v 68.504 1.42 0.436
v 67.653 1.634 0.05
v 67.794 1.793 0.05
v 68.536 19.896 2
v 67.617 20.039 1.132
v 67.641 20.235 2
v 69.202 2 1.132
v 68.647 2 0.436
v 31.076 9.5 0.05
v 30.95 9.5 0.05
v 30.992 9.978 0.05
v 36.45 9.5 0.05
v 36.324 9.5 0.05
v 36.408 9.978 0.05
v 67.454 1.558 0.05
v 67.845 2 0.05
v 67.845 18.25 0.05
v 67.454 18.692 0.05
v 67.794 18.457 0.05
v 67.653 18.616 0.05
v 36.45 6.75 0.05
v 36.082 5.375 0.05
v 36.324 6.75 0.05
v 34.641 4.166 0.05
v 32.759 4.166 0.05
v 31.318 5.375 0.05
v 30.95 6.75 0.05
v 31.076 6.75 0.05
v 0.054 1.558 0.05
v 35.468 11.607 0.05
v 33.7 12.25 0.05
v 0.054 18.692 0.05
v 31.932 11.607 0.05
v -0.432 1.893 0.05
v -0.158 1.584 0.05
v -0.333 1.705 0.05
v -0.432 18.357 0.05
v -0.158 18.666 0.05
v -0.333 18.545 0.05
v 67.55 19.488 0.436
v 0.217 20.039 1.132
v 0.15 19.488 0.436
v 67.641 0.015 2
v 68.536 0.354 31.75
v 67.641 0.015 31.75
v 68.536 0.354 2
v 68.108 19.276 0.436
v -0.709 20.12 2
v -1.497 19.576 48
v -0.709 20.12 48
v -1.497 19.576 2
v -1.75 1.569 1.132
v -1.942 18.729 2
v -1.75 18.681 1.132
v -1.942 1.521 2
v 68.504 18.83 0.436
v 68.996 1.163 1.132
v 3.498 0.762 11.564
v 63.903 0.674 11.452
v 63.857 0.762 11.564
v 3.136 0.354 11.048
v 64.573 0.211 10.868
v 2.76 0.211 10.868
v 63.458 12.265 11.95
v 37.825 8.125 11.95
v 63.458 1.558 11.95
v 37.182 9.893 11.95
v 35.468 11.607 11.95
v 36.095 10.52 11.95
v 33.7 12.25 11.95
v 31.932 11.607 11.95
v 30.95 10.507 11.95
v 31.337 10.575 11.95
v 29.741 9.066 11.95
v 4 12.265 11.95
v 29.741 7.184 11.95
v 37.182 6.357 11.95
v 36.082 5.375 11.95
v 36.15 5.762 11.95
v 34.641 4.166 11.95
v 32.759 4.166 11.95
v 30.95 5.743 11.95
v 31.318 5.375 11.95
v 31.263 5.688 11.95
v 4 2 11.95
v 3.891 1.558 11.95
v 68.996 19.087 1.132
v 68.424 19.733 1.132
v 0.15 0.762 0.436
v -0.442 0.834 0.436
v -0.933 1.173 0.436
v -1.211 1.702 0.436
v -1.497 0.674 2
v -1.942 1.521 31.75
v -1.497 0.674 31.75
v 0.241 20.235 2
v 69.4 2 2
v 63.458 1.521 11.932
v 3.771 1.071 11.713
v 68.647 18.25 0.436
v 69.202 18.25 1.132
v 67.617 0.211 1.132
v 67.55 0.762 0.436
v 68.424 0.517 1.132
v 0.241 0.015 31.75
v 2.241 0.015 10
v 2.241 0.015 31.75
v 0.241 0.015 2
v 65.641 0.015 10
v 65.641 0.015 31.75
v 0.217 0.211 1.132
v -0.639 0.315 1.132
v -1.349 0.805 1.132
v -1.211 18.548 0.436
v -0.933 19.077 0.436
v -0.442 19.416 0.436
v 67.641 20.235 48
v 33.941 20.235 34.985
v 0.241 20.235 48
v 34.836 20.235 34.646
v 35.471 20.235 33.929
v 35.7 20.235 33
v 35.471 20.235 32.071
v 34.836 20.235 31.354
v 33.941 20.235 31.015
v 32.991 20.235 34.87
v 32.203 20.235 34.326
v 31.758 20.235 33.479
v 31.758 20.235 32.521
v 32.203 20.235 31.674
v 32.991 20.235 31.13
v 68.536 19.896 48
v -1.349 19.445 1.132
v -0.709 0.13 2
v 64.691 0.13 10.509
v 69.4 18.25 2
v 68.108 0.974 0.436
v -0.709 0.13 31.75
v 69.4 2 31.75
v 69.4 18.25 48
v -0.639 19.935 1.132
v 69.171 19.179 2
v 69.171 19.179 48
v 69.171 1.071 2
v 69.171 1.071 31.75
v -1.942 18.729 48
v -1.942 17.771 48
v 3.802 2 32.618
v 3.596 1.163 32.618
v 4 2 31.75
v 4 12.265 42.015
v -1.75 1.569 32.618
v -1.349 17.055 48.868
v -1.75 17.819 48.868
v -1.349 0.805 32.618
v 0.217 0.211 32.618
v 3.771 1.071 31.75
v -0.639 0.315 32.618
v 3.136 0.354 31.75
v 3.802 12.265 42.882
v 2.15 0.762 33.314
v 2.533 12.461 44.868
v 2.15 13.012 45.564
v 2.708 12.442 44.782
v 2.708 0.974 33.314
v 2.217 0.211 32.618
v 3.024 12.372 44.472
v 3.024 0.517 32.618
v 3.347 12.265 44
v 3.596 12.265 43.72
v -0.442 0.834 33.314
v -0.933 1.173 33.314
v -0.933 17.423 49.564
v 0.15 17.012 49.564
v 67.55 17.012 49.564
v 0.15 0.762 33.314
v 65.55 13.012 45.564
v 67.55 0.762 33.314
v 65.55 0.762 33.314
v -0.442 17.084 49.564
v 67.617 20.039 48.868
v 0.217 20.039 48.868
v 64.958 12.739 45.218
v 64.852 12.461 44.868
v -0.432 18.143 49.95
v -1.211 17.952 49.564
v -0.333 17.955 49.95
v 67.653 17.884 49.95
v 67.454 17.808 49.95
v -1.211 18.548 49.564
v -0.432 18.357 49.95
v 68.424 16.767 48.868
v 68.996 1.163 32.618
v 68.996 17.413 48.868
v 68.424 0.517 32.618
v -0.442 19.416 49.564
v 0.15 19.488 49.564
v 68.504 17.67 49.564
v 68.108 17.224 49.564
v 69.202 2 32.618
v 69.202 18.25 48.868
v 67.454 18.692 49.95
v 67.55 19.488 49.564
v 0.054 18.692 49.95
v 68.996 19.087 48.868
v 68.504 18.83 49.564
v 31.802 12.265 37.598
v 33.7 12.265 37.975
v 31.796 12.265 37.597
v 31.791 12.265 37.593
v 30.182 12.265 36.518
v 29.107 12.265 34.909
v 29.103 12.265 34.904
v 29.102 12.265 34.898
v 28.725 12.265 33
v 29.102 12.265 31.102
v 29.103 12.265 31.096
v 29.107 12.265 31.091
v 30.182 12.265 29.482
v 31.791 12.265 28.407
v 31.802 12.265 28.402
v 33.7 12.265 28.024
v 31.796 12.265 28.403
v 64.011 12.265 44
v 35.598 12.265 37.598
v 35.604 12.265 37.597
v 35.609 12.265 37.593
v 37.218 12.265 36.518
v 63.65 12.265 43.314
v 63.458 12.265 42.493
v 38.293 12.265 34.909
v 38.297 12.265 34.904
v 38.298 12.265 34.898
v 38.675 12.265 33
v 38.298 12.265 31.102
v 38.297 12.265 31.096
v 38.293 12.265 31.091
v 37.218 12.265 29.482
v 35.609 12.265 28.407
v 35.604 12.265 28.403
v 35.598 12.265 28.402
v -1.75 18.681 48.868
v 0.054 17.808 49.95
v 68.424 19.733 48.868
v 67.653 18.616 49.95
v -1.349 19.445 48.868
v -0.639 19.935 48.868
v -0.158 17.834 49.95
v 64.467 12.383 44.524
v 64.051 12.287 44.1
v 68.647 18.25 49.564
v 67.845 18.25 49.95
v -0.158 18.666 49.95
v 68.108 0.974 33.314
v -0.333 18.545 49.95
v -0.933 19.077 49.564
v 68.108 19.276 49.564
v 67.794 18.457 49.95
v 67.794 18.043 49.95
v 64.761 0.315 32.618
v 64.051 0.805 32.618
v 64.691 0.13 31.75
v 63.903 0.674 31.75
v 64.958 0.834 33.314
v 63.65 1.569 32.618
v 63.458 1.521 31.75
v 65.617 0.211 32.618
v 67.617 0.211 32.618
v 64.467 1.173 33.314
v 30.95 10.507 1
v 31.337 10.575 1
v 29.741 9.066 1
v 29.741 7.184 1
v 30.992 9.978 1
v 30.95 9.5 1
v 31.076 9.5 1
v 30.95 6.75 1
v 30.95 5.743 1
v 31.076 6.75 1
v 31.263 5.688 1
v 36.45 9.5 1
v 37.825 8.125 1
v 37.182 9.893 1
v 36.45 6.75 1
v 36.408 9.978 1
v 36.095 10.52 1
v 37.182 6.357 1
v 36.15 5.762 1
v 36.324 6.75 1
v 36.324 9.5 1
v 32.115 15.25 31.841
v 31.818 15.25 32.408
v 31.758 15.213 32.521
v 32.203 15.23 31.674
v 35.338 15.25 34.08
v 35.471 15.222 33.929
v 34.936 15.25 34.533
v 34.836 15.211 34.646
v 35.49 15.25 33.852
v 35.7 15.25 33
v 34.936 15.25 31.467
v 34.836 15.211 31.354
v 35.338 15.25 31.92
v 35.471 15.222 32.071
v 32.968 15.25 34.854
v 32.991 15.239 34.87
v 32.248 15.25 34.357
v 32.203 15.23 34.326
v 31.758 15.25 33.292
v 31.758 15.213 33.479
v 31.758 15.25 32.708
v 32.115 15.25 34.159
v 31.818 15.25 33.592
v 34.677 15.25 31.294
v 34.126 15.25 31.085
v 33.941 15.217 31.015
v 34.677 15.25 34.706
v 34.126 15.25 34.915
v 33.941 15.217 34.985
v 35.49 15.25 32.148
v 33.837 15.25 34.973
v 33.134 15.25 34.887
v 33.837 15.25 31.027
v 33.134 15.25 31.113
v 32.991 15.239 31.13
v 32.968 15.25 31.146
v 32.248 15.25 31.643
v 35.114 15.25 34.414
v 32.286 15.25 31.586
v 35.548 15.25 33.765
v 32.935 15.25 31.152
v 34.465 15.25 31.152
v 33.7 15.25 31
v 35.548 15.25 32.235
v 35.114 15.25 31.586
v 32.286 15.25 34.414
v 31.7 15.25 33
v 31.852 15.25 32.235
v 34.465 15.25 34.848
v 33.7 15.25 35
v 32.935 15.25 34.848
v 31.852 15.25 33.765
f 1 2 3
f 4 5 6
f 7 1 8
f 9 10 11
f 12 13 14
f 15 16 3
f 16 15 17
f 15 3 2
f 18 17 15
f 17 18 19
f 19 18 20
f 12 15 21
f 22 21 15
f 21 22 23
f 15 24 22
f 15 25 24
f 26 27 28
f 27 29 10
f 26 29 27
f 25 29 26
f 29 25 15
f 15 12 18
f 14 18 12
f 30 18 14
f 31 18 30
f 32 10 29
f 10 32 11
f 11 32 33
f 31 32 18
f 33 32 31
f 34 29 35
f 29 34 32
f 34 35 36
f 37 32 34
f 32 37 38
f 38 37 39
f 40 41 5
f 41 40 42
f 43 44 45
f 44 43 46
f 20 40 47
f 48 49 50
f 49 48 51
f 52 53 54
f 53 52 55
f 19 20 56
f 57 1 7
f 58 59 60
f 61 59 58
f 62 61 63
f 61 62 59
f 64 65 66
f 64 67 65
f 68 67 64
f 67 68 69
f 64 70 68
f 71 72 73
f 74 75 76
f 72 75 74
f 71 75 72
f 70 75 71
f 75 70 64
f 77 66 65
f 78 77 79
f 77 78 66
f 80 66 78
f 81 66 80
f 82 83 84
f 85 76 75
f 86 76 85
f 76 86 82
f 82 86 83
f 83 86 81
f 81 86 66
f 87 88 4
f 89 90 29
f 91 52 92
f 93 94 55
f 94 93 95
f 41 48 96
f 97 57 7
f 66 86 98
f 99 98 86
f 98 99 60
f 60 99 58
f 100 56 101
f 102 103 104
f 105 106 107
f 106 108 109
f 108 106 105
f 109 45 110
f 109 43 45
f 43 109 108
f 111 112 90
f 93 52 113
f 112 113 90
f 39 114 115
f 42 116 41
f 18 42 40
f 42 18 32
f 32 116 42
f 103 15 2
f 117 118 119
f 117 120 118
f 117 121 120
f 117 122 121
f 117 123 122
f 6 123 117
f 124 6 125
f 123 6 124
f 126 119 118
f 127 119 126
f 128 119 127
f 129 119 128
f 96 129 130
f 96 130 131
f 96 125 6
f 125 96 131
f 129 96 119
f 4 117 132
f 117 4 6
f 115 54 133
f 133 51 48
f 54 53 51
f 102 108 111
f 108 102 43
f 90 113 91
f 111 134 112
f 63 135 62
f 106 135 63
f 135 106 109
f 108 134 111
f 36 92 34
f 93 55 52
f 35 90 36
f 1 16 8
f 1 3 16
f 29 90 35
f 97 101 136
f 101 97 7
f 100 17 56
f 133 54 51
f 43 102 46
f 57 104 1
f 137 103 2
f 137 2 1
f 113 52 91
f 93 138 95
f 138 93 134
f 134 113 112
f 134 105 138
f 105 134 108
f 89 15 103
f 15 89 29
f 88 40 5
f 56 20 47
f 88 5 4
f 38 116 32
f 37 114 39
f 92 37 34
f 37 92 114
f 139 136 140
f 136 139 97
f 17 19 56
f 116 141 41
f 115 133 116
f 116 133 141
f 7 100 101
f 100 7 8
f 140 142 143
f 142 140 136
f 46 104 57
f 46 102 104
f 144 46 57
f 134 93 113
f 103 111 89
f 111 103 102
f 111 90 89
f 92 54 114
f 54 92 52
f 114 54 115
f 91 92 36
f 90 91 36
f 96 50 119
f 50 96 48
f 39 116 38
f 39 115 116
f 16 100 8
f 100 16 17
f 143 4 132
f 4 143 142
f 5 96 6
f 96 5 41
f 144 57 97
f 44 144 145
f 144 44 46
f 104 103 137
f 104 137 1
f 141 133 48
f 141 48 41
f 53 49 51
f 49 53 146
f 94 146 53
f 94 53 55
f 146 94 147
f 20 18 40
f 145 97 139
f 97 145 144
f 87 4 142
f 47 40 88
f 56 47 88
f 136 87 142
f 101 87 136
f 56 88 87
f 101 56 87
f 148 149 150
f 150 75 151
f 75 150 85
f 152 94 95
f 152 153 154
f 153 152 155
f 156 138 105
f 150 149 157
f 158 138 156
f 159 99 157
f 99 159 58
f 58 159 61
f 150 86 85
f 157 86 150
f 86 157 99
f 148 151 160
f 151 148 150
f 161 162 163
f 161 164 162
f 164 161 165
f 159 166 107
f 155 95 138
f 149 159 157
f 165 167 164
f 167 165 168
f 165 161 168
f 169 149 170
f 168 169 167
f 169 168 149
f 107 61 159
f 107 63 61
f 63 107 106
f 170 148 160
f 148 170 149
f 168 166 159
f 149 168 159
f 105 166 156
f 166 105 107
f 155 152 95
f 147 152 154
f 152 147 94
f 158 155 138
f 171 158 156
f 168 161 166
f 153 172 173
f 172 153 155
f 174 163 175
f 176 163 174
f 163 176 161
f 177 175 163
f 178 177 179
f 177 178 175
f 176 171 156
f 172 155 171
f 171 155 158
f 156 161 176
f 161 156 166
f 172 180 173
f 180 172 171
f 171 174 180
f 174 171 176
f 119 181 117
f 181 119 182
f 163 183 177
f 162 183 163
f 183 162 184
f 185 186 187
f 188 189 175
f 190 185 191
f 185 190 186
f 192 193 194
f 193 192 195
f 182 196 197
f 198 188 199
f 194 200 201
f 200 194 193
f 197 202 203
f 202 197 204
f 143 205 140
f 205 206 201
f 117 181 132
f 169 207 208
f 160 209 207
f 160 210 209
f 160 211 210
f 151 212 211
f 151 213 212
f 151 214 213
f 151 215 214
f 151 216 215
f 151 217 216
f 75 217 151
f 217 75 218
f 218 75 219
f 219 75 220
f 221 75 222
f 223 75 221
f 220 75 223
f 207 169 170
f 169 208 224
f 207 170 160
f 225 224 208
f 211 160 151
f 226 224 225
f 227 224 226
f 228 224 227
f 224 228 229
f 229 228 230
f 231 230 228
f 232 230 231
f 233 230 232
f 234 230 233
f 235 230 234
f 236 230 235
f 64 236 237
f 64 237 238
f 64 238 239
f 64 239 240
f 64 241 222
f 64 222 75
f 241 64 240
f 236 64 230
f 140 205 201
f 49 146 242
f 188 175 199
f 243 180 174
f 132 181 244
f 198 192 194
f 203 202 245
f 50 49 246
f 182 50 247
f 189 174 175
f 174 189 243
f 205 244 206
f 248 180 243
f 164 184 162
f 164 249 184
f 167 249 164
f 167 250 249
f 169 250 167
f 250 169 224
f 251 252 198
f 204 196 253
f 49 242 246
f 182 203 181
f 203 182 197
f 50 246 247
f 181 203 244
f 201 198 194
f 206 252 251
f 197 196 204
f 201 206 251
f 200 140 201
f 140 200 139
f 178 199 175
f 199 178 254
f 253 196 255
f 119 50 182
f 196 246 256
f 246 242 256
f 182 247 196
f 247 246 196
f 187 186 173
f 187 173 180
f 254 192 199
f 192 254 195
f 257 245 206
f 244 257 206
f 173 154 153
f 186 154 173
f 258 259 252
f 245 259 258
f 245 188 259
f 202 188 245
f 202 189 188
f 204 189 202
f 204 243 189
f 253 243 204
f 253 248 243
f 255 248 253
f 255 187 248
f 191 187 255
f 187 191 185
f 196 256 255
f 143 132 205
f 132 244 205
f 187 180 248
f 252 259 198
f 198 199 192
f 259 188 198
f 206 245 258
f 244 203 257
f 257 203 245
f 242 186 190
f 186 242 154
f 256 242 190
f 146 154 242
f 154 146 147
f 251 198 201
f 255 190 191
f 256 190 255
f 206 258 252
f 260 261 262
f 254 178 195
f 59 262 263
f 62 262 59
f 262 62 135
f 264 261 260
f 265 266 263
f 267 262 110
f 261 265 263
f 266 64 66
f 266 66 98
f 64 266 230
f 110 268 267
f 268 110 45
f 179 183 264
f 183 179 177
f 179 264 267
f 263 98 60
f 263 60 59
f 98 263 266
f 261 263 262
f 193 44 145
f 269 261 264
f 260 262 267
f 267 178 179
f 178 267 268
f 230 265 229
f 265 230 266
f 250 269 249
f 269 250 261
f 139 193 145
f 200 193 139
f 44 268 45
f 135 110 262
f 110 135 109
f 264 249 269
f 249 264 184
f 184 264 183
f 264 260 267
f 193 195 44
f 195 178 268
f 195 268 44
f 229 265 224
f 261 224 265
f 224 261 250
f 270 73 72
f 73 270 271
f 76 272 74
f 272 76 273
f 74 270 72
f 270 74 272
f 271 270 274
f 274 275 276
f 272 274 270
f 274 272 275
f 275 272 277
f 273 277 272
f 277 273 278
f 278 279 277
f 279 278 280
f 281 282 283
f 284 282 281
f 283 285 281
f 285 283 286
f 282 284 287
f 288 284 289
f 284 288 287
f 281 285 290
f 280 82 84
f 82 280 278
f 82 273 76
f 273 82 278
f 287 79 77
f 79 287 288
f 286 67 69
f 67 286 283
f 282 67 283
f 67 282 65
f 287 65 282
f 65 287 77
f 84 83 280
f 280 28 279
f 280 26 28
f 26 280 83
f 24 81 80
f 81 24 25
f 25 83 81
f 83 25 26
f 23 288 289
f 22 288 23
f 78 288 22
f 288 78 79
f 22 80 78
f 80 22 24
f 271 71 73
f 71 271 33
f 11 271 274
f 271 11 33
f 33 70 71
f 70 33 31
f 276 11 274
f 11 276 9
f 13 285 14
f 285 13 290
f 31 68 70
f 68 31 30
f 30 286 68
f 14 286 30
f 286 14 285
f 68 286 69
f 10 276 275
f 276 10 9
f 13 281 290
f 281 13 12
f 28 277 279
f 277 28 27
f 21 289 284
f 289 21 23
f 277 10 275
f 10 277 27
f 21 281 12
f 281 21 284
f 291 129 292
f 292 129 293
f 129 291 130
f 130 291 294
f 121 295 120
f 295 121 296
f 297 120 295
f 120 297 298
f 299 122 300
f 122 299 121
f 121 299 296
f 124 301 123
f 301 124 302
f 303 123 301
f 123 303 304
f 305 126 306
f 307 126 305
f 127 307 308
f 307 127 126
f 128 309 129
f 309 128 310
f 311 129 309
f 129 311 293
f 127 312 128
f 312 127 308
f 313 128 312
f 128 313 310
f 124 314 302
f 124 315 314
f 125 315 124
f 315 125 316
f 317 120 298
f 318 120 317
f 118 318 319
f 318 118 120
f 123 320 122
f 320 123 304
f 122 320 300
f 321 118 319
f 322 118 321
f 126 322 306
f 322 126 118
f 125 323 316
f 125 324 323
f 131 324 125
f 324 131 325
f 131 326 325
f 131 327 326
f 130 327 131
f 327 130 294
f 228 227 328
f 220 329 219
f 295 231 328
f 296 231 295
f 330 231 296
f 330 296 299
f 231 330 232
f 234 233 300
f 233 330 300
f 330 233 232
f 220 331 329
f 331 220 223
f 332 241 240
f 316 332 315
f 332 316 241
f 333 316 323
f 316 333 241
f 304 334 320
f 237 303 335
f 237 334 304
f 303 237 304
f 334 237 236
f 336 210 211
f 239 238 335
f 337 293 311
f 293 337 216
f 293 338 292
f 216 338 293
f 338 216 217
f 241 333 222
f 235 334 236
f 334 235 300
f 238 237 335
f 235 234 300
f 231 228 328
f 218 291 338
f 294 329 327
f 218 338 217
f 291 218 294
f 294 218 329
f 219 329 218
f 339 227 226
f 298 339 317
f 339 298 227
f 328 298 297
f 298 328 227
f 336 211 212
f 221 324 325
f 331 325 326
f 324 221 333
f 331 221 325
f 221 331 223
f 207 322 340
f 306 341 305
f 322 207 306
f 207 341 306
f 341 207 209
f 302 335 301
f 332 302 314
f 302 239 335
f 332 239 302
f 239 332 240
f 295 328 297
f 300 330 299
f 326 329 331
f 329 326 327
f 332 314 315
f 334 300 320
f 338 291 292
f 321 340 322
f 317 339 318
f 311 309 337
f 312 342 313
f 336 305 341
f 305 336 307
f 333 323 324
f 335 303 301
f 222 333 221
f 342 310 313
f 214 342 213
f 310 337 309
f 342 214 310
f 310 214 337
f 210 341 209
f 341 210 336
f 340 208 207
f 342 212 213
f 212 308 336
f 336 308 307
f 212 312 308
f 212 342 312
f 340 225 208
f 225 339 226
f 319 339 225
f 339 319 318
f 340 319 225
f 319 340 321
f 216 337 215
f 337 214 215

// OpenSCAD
/* [Phones] */

Phone_1=0; // [0:iPhone 5, 1:iPhone 5 in Belkin Grip Candy Sheer, 2: iPhone 5 in Incipio Dual Pro, 3:iPhone 4/4s, 4:iPhone 4/4s in elago S4 Glide, 5:iPhone 4/4s in iFrogz Luxe Lean, 99:Custom]
Phone_2=-1; // [-1:None, 0:iPhone 5, 1:iPhone 5 in Belkin Grip Candy Sheer, 2: iPhone 5 in Incipio Dual Pro, 3:iPhone 4/4s, 4:iPhone 4/4s in elago S4 Glide, 5:iPhone 4/4s in iFrogz Luxe Lean, 99:Custom]
Phone_3=-1; // [-1:None, 0:iPhone 5, 1:iPhone 5 in Belkin Grip Candy Sheer, 2: iPhone 5 in Incipio Dual Pro, 3:iPhone 4/4s, 4:iPhone 4/4s in elago S4 Glide, 5:iPhone 4/4s in iFrogz Luxe Lean, 99:Custom]

// Dock Wall Thickness

/* [Advanced Settings] */
wall_thickness=4; //[1:6]
rounding_radius=2;

// Screw hole height
screw_height=20; //[0:35]
// Screw Diameter
screw_diameter=4; //[1:6]
// Countersink Size
screw_countersink_size=3;
//  Countersink Depth
screw_countersink_depth=3;


actual_depth=20.25;
/* [Custom Dimensions] */
/* Custom 1 Width */
Custom1_width=59.4;
/* Custom 1 Depth */
Custom1_depth=8.25;
//What kind of connector does your phone have?
Custom1_connector="Lightning"; /* ["Lightning", "Dock"] */
//How far should the connector body stick out of the bottom of the dock?
Custom1_stickout=0;
 
/* Custom 2 Width */
Custom2_width=59.4;
/* Custom 2 Depth */
Custom2_depth=8.25;
//What kind of connector does your phone have?
Custom2_connector="Lightning"; /* ["Lightning", "Dock"] */
//How far should the connector body stick out of the bottom of the dock?
Custom2_stickout=0;
 
/* Custom 3 Width */
Custom3_width=59.4;
/* Custom 3 Depth */
Custom3_depth=8.25;
//What kind of connector does your phone have?
Custom3_connector="Lightning"; /* ["Lightning", "Dock"] */
//How far should the connector body stick out of the bottom of the dock?
Custom3_stickout=0;
 

/* [hidden] */
custom1=[Custom1_width, Custom1_depth, 40, Custom1_connector, Custom1_stickout];
custom2=[Custom2_width, Custom2_depth, 40, Custom2_connector, Custom2_stickout];
custom3=[Custom3_width, Custom3_depth, 40, Custom3_connector, Custom3_stickout];

button_cutout_radius=8;
button_height=10;
circle_precision=1;
usb_connector_height=20;

dock_connector_thickness=6.0;
dock_connector_width=27;
dock_connector_height=9;

lightning_connector_height=12;
lightning_connector_width=8.25;
lightning_connector_thickness=5.5;

/* Turn of rounding for fast preview */
preview_tab="none";


extra=0.1;
overlap=0.05;
dimensions=[ /* [phone_width, phone_depth, pocket_height, connector, connector_stickout] */
	/* iphone 5 */
	[59.4,8.25,40,"lightning",0],
	/* iphone 5 in belkin case */
	[64.25,10.75,40,"lightning",2.5],
	/* iPhone 5 in incipio Dual Pro */
	[65.25, 13.5, 40, "lightning", 0],
     /* iphone 4/4s */
	[59.25, 9.75, 40, "dock", 0],
     /*  iphone 4/4s in elago S4 Glide */
     [63.5, 12.25, 40, "dock", 0],
	/*  iphone 4/4s in ifrogz */
     [61.5, 12, 40, "dock", 0]
	];

if (Phone_1==99)
	iphone_dock(custom1,rounding=rounding_radius);
else 
	iphone_dock(dimensions[Phone_1], rounding=rounding_radius);
if (Phone_2 != -1) {
	translate([(Phone_1==99 ? custom1[0] : dimensions[Phone_1][0])+wall_thickness*2-overlap,0,0]) 	{
		if (Phone_2==99 )
			iphone_dock(custom2, rounding=rounding_radius);
            else 
			iphone_dock(dimensions[Phone_2], rounding=rounding_radius);
		if (Phone_3 != -1)
			translate([(Phone_2==99 ? custom2[0] : dimensions[Phone_2][0])+wall_thickness*2-overlap,0,0])
				if (Phone_3==99)
					iphone_dock(custom3, rounding=rounding_radius);
				else
					iphone_dock(dimensions[phone3], rounding=rounding_radius);
	}
}

module iphone_dock(setup=[59.4, 8.25, 40, "lightning", 0], rounding=false) {
	phone_width=setup[0];
	phone_depth=setup[1];
	pocket_height=setup[2];
	connector=setup[3];
	connector_stickout=setup[4];

	case_width=phone_width+wall_thickness*2;
	case_depth=phone_depth+wall_thickness*2;
	case_height=pocket_height+wall_thickness+dock_connector_height;

	translate([case_width/2,case_depth/2,0]) difference() {
		if (rounding!=0 && preview_tab == "none") {
			minkowski() {
				difference() {
					translate([-case_width/2,-case_depth/2,0]) rotate([90,0,90]) 
						linear_extrude(height=case_width) 
							polygon(points=[[rounding_radius,rounding_radius],[actual_depth-rounding_radius,rounding_radius],[actual_depth-rounding_radius,case_height-rounding_radius*2.5],[rounding_radius,case_height-actual_depth-rounding_radius/2]]);
						translate([0,0,pocket_height/2+wall_thickness+dock_connector_height-rounding_radius])
							cube([phone_width+rounding_radius*2,phone_depth+rounding_radius*2,pocket_height+rounding_radius], center=true);
						translate([0,-case_depth/2+wall_thickness/2,wall_thickness+dock_connector_height+button_height])
							button_cutout();
					}
				sphere(rounding_radius, $fs=circle_precision);
			}
		} else {
			difference() {
				translate([-case_width/2,-case_depth/2,0]) rotate([90,0,90]) 
					linear_extrude(height=case_width) 
						polygon(points=[[0,0],[actual_depth,0],[actual_depth,case_height],[0,case_height-actual_depth]]);
						translate([0,0,pocket_height/2+wall_thickness+dock_connector_height])
							cube([phone_width,phone_depth,pocket_height], center=true);
						translate([0,-case_depth/2+wall_thickness/2,wall_thickness+dock_connector_height+button_height])
							button_cutout();
			}
		}
		if (connector=="dock") {
			usb_connector(h=wall_thickness+dock_connector_height);
			translate([0,0,wall_thickness+connector_stickout]) dock_connector();
		} else if (connector=="lightning") {
			translate([0,0,wall_thickness-(lightning_connector_height-dock_connector_height)+connector_stickout])
				lightning_cutout();
		}
		translate([0,case_depth/2,wall_thickness+dock_connector_height+screw_height])
			rotate([90,0,0]) {
				translate([0,0,-wall_thickness]) cylinder(r=screw_diameter/2, h=wall_thickness*2, $fs=circle_precision);
					translate([0,0,wall_thickness-screw_countersink_depth]) 
						cylinder(r1=screw_diameter/2, r2=screw_diameter/2+screw_countersink_size, h=screw_countersink_depth+0.01);
		}
	}
}

module dock_connector() {
		translate([0,0,dock_connector_height/2]) union() {
			cube([dock_connector_width-dock_connector_thickness,dock_connector_thickness,dock_connector_height], center=true);
			for (offset=[-1,1]) translate([offset*(dock_connector_width/2-dock_connector_thickness/2),0,0]) cylinder(r=dock_connector_thickness/2, h=dock_connector_height, $fs=circle_precision, center=true);
		}
}

module usb_connector(height=20) {
	connector_thickness=8.0;
	connector_width=15.0;
	rounding=1.6;

	translate([0,0,height/2]) {
		cube([connector_width-rounding*2, connector_thickness, height], center=true);
		cube([connector_width, connector_thickness-rounding*2, height], center=true);
		for (yoffset=[-1,1]) for (xoffset=[-1,1]) translate([xoffset*(connector_width/2-rounding),yoffset*(connector_thickness/2-rounding),0]) cylinder(r=rounding, h=height, $fs=circle_precision, center=true);
	}
}

module lightning_connector() {
	thickness=lightning_connector_thickness;
	width=lightning_connector_width;
	height=lightning_connector_height;
	cord=4;
	translate([0,0,height/2])
		cube([width-thickness, thickness, height], center=true);
	for (n=[-1,1])
		translate([n*(width/2-thickness/2),0,0])
			cylinder(r=thickness/2, h=height);
	translate([0,0,-25])
		cylinder(r=cord/2,h=26);
}

module lightning_cutout(height=30) {
	width=lightning_connector_width;
	thickness=lightning_connector_thickness;
	lightning_connector();
	translate([0,0,lightning_connector_height-height])
		rotate([0,0,90]) {
			translate([0,0,height/2])
				cube([width-thickness, thickness, height], center=true);
			for (n=[-1,1])
				translate([n*(width/2-thickness/2),0,0])
					cylinder(r=thickness/2, h=height);
	}
}

module button_cutout() {
		translate([0,wall_thickness,0])
			rotate([90,0,0])
				cylinder(r=button_cutout_radius+rounding_radius, h=wall_thickness*2, $fs=circle_precision);
		translate([-button_cutout_radius-rounding_radius,-wall_thickness,0])
			cube([button_cutout_radius*2+rounding_radius*2, wall_thickness*2, 100]);
		
}
module button_cutout_rounding() {
	button_cutout_height=case_height-case_depth-button_height-wall_thickness-dock_connector_height;
	union() {
		rotate([90,0,0]) difference() {
			rotate_extrude(convexity=4, $fn=30)
				translate([button_cutout_radius+rounding_radius,0,0])
					circle(r=rounding_radius, $fs=circle_precision);
			translate([-button_cutout_radius-rounding_radius*2,0,-rounding_radius])
				cube([button_cutout_radius*2+rounding_radius*4,button_cutout_radius*2+rounding_radius*2,rounding_radius*2]);
		}
		for (xloc=[-button_cutout_radius-rounding_radius,button_cutout_radius+rounding_radius]) translate([xloc,0,0]) {
			cylinder(r=rounding_radius, h=button_cutout_height, $fs=circle_precision);
			translate([0,0,button_cutout_height]) sphere(r=rounding_radius, $fs=circle_precision);
		}
		
	}
}
